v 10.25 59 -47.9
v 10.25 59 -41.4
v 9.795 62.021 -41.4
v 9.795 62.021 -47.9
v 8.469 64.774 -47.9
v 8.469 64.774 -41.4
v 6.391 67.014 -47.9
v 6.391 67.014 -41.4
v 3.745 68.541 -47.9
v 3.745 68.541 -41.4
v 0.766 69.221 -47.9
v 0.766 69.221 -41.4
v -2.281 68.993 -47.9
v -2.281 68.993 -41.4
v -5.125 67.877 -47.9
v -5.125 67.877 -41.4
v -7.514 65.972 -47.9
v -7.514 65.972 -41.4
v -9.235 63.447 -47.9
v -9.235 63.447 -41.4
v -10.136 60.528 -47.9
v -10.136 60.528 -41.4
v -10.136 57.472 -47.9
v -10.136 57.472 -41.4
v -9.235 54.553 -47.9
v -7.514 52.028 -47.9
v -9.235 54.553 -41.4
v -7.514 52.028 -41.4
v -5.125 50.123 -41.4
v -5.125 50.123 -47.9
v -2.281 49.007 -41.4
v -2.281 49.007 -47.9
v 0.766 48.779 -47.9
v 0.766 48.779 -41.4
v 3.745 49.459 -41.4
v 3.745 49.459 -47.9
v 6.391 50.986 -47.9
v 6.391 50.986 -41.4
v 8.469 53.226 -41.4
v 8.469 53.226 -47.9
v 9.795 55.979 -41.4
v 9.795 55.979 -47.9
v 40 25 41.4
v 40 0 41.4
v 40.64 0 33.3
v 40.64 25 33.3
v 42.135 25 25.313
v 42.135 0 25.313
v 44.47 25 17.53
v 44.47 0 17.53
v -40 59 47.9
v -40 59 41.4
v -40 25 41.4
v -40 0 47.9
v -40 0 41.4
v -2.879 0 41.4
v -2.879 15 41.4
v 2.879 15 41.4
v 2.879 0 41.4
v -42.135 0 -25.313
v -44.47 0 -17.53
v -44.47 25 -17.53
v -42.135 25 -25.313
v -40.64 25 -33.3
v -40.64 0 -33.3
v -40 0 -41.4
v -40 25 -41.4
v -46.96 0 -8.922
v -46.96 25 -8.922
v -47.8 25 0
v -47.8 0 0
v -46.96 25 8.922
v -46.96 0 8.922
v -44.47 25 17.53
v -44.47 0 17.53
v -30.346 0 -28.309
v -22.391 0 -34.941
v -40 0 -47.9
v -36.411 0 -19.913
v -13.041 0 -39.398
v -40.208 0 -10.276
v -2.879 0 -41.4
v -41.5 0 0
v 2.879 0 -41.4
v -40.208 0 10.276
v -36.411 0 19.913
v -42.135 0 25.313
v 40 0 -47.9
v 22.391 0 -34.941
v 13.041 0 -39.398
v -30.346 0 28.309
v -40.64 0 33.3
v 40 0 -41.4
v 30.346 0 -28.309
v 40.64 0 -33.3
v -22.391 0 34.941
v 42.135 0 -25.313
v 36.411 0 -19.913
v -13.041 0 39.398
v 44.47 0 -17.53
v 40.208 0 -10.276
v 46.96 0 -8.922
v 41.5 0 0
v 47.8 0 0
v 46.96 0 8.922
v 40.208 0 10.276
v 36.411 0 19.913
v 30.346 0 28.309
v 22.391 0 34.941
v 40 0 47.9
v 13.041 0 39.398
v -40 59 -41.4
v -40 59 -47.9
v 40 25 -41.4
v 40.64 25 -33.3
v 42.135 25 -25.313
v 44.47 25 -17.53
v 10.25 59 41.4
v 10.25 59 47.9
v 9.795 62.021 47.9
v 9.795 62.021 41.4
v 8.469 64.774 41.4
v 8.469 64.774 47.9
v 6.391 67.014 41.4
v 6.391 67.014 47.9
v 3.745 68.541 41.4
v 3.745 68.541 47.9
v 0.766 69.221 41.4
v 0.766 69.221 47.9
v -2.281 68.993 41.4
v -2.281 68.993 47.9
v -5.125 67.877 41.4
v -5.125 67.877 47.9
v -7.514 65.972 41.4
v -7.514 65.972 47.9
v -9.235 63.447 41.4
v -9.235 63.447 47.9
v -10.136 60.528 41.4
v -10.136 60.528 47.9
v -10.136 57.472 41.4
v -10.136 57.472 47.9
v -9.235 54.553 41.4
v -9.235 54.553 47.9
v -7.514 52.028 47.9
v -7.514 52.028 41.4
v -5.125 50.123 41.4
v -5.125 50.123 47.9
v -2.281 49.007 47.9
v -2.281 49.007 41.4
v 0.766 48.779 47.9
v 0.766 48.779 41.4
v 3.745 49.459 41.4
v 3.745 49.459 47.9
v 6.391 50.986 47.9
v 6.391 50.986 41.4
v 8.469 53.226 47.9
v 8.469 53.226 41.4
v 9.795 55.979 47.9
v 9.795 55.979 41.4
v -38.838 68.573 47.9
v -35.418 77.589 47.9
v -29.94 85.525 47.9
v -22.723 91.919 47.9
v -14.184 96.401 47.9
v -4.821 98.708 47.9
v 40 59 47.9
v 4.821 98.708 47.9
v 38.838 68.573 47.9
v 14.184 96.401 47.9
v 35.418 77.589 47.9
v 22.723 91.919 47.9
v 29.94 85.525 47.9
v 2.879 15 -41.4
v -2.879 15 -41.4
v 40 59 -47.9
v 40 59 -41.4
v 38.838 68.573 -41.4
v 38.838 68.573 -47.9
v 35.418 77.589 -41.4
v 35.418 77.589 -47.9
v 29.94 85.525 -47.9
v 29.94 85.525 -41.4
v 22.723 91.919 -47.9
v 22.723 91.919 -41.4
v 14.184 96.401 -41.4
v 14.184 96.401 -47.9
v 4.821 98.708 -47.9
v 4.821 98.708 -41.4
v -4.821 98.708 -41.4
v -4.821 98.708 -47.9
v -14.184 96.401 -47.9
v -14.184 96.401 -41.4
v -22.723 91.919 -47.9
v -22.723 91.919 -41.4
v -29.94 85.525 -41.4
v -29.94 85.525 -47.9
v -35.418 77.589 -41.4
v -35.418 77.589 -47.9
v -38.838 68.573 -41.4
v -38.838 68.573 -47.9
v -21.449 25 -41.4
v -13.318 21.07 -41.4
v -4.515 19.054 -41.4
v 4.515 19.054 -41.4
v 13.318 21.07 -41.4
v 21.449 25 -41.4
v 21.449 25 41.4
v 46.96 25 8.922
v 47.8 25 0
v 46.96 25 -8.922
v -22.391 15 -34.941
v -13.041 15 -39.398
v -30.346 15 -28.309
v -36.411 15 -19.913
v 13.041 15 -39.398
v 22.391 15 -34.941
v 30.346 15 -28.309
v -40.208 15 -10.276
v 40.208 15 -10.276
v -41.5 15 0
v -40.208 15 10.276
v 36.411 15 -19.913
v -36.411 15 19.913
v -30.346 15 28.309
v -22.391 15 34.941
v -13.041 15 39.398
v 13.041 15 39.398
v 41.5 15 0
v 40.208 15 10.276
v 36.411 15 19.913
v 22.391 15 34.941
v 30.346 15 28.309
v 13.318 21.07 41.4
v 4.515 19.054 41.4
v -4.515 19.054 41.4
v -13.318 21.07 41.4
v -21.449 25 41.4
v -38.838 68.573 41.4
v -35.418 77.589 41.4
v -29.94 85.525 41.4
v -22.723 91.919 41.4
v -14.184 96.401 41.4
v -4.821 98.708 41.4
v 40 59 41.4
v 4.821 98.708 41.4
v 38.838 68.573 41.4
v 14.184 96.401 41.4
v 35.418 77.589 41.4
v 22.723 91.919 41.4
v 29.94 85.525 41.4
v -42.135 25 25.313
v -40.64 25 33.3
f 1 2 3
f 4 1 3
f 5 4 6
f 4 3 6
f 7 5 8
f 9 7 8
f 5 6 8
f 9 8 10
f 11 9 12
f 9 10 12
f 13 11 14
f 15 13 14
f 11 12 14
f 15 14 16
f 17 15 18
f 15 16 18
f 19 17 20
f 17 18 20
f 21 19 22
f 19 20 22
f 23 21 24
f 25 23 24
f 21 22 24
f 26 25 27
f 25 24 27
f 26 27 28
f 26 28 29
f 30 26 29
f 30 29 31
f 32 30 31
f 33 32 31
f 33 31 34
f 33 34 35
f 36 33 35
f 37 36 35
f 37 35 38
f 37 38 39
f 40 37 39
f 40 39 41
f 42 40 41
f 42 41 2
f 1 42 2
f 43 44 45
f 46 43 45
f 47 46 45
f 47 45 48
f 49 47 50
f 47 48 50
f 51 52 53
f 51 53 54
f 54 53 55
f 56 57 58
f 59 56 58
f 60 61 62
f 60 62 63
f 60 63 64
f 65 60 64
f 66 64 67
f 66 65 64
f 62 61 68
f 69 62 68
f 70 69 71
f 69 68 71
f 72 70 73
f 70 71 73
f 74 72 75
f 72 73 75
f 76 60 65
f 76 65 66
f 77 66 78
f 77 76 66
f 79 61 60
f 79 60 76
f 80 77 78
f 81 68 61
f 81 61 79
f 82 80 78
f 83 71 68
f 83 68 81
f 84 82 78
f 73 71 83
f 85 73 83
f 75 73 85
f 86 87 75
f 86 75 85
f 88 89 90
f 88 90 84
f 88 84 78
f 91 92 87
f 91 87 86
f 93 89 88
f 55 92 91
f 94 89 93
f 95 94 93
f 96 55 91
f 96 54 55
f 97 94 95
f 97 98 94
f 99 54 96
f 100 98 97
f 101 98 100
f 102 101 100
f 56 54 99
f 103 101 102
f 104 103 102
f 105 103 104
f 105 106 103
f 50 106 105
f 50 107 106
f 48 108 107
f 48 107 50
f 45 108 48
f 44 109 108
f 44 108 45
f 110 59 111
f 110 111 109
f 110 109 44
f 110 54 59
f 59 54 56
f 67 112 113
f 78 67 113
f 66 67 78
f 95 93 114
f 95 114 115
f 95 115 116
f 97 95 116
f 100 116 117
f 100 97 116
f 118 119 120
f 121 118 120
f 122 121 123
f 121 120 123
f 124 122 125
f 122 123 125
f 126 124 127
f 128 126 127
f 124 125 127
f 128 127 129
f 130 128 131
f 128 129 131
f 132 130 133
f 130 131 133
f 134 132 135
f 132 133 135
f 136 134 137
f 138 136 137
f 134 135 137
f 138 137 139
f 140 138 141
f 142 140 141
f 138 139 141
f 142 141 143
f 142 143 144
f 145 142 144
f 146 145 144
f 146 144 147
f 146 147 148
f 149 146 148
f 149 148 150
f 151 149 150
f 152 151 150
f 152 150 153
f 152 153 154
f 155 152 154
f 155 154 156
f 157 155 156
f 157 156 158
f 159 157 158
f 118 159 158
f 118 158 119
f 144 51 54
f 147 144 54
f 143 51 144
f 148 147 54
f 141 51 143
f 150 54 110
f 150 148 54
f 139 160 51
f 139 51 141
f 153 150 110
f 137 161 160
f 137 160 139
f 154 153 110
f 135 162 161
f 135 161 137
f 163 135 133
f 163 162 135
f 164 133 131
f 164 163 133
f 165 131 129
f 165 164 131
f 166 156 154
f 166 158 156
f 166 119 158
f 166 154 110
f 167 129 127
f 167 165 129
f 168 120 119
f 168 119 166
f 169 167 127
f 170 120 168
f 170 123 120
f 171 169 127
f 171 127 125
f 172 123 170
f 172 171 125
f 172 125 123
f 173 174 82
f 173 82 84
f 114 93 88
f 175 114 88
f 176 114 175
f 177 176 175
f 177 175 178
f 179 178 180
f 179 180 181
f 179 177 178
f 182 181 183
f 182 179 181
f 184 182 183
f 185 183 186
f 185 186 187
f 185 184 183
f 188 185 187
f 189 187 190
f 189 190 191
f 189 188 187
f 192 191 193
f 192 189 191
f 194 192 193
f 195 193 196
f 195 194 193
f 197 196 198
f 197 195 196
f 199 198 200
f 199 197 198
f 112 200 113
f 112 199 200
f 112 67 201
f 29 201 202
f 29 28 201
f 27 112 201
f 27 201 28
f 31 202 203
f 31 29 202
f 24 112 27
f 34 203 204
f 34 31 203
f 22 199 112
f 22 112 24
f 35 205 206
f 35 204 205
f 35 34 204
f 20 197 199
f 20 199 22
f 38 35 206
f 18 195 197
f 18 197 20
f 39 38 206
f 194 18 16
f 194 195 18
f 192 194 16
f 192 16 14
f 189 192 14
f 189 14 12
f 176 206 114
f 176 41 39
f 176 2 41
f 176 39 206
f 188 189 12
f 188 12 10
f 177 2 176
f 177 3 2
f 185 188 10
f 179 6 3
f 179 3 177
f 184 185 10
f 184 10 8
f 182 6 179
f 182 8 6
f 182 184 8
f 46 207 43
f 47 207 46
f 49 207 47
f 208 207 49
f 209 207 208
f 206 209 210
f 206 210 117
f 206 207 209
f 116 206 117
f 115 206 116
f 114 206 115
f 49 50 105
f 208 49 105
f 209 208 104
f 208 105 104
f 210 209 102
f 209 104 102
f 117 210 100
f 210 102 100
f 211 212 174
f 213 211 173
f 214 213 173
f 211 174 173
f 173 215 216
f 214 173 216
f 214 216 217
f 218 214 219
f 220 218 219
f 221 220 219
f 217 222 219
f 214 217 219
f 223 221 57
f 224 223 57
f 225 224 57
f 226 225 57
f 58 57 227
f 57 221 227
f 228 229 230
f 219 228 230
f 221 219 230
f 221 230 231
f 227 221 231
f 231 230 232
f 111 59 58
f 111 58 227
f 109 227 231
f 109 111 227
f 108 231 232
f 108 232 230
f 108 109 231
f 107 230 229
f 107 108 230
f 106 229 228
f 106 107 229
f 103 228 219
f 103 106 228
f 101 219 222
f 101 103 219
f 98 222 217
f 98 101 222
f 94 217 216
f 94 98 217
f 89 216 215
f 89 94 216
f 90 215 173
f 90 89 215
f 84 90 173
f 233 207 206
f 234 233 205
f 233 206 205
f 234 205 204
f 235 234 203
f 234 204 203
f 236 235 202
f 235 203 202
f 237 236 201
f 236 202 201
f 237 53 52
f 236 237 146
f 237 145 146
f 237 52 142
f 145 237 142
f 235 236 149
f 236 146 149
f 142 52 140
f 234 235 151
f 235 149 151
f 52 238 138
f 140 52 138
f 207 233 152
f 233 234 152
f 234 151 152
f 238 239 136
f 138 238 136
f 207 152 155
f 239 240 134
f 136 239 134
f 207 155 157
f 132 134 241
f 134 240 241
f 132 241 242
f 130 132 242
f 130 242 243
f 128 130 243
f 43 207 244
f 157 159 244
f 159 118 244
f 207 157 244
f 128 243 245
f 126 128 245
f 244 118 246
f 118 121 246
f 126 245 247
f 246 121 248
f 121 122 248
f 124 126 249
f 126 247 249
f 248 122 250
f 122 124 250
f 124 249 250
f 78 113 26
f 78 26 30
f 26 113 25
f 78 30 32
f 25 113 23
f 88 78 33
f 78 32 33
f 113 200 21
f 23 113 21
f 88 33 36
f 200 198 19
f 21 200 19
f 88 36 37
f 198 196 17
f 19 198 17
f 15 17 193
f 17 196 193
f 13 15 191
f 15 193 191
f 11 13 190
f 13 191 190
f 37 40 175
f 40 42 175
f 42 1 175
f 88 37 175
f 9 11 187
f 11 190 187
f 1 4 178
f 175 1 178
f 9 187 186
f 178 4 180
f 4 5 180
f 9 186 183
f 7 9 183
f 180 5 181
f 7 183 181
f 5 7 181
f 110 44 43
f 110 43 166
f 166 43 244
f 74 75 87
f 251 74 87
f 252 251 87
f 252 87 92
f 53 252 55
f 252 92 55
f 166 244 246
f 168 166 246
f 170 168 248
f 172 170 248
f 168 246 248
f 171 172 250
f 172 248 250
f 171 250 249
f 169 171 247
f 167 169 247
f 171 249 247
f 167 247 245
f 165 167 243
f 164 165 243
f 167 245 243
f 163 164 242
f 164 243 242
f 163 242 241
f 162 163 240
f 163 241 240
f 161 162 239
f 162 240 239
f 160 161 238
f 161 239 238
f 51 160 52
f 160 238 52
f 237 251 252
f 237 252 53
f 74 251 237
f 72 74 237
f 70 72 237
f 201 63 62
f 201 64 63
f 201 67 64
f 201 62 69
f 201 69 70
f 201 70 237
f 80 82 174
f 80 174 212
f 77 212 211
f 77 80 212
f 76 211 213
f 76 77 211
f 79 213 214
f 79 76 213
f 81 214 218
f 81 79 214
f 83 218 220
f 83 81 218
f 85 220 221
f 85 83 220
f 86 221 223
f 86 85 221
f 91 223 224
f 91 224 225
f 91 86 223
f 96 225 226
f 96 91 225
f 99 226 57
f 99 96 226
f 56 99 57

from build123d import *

# Parameters (mm, degrees)
SKETCH1_R                  = 47.8
SKETCH1_R_2                = 41.5
CAP_BASE_DEPTH             = 15
SKETCH2_R                  = 47.8
CAP_TOP_DEPTH              = 10
SIDES_START                = 41.4
SIDES_DEPTH                = 6.5
SIDES_START_2              = -25
SIDES_TO_CAP_DEPTH         = 25
SKETCH5_R                  = 40.2
TRACKS_FOR_HOUSING_DEPTH   = 45
SKETCH6_R                  = 10.25
HOLE_FOR_GEAR_SHAFTS_DEPTH = 146.82002606


with BuildPart() as part:
    # Sketch1 → Cap base (new body)
    with BuildSketch(Plane(origin=(0, 0, 0), x_dir=(1, 0, 0), z_dir=(0, 1, 0))):
        with Locations(Location((0, 0, 0), (0, 0, 270))):
            Circle(SKETCH1_R)
        with Locations(Location((0, 0, 0), (0, 0, 270))):
            Circle(SKETCH1_R_2, mode=Mode.SUBTRACT)
    extrude(amount=CAP_BASE_DEPTH)

    # Sketch2 → Cap top (add)
    with BuildSketch(Plane(origin=(0, 15, 0), x_dir=(1, 0, 0), z_dir=(0, 1, 0))):
        with Locations(Location((0, 0, 0), (0, 0, 270))):
            Circle(SKETCH2_R)
    extrude(amount=CAP_TOP_DEPTH)

    # Sketch3 → Sides (add)
    with BuildSketch(Plane.XY.offset(SIDES_START)):
        with BuildLine():
            Line((-40, 59), (-40, 0))
            Line((-40, 0), (40, 0))
            Line((40, 0), (40, 59))
            ThreePointArc((40, 59), (0, 99), (-40, 59))
        make_face()
    sides = extrude(amount=SIDES_DEPTH)

    # Sketch4 → Sides to cap (add)
    with BuildSketch(Plane(origin=(0, 25, 0), x_dir=(1, 0, 0), z_dir=(0, 1, 0)).offset(SIDES_START_2)):
        with BuildLine():
            ThreePointArc((-23.893095237, -41.4), (-36.205132569, -31.209427673), (-44.469611721, -17.529792737))
            ThreePointArc((-44.469611721, -17.529792737), (-41.281194911, -29.286336098), (-40, -41.4))
            Line((-40, -41.4), (-23.893095237, -41.4))
        make_face()
        with BuildLine():
            Line((23.893095237, -41.4), (40, -41.4))
            ThreePointArc((40, -41.4), (41.281194911, -29.286336098), (44.469611721, -17.529792737))
            ThreePointArc((44.469611721, -17.529792737), (36.205132569, -31.209427673), (23.893095237, -41.4))
        make_face()
    sides_to_cap = extrude(amount=SIDES_TO_CAP_DEPTH)

    # Mirror1: Sides to cap across plane
    add(sides_to_cap.mirror(Plane.XY))

    # Mirror sides: Sides across plane
    add(sides.mirror(Plane.XY))

    # Sketch5 → Tracks for housing (cut)
    with BuildSketch(Plane(origin=(0, 0, 41.4), x_dir=(-1, 0, 0), z_dir=(0, 0, -1))):
        with Locations((0, 59)):
            Circle(SKETCH5_R)
    tracks_for_housing = extrude(amount=TRACKS_FOR_HOUSING_DEPTH, mode=Mode.SUBTRACT)

    # Mirror tracks: Tracks for housing across plane
    add(tracks_for_housing.mirror(Plane.XY), mode=Mode.SUBTRACT)

    # Sketch6 → Hole for gear shafts (cut, through all)
    with BuildSketch(Plane.XY.offset(47.9)):
        with Locations((0, 59)):
            Circle(SKETCH6_R)
    extrude(amount=-HOLE_FOR_GEAR_SHAFTS_DEPTH, mode=Mode.SUBTRACT)


solid = part.part
